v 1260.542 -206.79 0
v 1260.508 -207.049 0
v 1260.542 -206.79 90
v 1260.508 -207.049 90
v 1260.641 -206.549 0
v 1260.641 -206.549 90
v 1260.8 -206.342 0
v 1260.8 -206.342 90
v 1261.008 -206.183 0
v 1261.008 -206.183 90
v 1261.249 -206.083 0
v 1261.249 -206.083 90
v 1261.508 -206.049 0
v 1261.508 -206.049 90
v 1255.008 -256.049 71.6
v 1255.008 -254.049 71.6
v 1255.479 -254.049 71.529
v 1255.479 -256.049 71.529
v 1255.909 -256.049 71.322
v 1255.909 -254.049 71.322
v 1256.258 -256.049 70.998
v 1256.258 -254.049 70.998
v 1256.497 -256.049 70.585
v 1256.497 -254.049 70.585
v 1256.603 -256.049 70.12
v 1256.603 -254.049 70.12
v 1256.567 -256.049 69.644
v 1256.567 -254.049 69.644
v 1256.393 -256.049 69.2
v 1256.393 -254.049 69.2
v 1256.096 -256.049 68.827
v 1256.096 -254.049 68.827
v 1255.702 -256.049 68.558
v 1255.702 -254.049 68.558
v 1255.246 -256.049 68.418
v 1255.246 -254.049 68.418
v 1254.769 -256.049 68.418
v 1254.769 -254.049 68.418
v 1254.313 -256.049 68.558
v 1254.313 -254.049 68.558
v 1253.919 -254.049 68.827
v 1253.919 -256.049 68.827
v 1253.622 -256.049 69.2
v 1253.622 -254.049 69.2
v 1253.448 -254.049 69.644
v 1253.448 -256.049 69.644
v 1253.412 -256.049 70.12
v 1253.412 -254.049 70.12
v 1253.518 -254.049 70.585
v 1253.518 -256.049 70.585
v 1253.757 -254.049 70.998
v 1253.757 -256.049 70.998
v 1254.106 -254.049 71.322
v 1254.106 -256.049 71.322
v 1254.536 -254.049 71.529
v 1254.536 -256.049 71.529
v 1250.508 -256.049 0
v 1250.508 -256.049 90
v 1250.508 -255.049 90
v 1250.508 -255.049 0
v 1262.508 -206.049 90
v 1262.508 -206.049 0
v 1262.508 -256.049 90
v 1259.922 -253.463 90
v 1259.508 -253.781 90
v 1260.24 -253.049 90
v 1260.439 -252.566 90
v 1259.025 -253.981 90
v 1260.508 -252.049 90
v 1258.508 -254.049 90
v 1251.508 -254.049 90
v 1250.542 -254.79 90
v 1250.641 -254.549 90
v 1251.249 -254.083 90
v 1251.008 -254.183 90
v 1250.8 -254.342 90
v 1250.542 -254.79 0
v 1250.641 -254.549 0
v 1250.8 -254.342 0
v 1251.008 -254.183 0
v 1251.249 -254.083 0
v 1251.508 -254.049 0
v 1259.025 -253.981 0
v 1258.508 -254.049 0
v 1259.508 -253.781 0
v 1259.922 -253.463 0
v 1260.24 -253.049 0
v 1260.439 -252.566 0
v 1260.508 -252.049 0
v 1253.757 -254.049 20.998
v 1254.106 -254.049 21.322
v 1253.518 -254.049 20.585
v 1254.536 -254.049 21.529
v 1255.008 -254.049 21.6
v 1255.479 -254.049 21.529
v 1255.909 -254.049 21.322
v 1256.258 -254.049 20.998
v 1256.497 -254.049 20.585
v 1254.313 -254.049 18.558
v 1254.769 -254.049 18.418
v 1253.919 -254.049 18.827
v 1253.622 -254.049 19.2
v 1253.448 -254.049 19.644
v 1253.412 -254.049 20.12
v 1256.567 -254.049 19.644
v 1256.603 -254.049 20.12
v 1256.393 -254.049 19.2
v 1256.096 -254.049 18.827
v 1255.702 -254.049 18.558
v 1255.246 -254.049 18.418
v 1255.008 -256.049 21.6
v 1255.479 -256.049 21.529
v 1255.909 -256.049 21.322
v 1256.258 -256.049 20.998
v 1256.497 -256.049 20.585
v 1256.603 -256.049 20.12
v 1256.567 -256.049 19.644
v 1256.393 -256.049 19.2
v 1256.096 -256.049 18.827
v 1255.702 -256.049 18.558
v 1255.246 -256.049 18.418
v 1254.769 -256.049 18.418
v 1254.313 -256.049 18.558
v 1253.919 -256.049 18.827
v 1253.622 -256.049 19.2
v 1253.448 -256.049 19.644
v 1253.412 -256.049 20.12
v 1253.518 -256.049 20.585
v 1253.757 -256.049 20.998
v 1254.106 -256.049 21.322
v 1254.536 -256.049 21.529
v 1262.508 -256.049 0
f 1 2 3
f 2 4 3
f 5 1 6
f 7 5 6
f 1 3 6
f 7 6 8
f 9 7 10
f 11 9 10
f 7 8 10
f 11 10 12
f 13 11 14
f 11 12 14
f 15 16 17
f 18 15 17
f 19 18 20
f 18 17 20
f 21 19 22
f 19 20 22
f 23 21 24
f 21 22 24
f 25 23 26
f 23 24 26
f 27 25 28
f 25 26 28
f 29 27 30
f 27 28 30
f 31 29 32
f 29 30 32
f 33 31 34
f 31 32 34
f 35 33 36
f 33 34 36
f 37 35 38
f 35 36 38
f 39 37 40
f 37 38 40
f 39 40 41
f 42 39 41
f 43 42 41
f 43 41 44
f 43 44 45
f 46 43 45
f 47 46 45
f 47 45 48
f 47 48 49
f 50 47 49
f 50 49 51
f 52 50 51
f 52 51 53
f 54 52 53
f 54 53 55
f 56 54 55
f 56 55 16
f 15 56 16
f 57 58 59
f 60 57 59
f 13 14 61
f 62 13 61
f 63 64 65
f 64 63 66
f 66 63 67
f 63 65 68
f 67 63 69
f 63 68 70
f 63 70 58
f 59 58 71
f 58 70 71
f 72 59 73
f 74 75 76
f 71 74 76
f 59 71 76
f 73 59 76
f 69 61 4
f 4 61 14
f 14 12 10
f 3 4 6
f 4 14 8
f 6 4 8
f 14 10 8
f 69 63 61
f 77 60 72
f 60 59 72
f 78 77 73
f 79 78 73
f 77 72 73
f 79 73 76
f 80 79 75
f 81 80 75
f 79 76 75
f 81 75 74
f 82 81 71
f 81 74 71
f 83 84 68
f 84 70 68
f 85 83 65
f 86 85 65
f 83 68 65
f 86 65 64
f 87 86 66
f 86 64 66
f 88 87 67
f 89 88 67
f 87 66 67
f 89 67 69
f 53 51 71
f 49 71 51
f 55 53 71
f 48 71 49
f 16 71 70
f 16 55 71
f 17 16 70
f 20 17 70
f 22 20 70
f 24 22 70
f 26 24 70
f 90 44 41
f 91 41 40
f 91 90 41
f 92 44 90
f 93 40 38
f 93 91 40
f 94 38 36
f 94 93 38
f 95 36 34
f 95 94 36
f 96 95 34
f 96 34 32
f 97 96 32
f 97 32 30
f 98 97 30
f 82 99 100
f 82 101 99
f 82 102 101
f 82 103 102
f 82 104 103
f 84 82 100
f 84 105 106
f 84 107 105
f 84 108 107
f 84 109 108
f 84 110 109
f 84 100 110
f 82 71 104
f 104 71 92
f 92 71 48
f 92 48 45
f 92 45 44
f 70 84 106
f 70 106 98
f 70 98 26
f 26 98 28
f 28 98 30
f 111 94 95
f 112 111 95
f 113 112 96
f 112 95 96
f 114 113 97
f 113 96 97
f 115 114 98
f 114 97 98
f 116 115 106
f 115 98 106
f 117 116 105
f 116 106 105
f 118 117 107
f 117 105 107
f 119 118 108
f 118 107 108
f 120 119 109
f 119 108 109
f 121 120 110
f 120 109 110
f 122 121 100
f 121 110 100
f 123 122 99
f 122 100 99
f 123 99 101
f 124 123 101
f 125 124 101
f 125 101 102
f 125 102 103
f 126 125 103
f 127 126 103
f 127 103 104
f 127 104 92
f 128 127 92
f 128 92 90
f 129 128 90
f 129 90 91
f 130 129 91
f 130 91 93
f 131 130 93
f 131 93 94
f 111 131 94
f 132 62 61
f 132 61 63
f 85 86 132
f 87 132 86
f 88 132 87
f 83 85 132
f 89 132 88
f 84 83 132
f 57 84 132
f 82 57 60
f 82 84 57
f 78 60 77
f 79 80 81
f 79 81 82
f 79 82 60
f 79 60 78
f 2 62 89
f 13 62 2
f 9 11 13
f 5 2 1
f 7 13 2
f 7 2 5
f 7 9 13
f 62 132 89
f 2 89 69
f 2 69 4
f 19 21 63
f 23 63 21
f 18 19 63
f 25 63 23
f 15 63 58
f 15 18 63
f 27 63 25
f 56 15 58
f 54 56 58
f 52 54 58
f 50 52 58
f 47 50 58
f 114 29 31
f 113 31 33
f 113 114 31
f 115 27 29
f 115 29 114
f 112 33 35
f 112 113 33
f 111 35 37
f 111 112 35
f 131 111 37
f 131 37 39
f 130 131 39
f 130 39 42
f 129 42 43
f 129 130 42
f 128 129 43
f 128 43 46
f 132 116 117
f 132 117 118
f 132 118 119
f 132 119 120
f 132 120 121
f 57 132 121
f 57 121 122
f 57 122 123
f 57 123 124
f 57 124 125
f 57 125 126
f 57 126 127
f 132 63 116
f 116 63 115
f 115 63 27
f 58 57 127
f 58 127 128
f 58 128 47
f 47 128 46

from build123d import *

# Parameters (mm, degrees)
BOSS_EXTRUDE1_DEPTH = 90
FILLET1_R           = 1
FILLET2_R           = 2
SKETCH2_R           = 1.6
CUT_EXTRUDE1_DEPTH  = 10


with BuildPart() as part:
    # Sketch1 → Boss-Extrude1 (new body)
    with BuildSketch(Plane.XY):
        Polygon((1262.507506827, -206.048661528), (1262.507506827, -256.048661528), (1250.507506827, -256.048661528), (1250.507506827, -254.048661528), (1260.507506827, -254.048661528), (1260.507506827, -206.048661528), align=None)
    extrude(amount=BOSS_EXTRUDE1_DEPTH)

    # Fillet1
    fillet1_edges = [part.edges().sort_by_distance(p)[0] for p in [
        (1250.507506827, -254.048661528, 45),
        (1260.507506827, -206.048661528, 45),
    ]]
    fillet(fillet1_edges, radius=FILLET1_R)

    # Fillet2
    fillet2_edges = [part.edges().sort_by_distance(p)[0] for p in [
        (1260.507506827, -254.048661528, 45),
    ]]
    fillet(fillet2_edges, radius=FILLET2_R)

    # Sketch2 → Cut-Extrude1 (cut)
    with BuildSketch(Plane(origin=(0, -254.048661528, 0), x_dir=(1, 0, 0), z_dir=(0, 1, 0))):
        with Locations(Location((1255.007506827, -70, 0), (0, 0, 270))):
            Circle(SKETCH2_R)
        with Locations(Location((1255.007506827, -20, 0), (0, 0, 270))):
            Circle(SKETCH2_R)
    extrude(amount=-CUT_EXTRUDE1_DEPTH, mode=Mode.SUBTRACT)


solid = part.part
